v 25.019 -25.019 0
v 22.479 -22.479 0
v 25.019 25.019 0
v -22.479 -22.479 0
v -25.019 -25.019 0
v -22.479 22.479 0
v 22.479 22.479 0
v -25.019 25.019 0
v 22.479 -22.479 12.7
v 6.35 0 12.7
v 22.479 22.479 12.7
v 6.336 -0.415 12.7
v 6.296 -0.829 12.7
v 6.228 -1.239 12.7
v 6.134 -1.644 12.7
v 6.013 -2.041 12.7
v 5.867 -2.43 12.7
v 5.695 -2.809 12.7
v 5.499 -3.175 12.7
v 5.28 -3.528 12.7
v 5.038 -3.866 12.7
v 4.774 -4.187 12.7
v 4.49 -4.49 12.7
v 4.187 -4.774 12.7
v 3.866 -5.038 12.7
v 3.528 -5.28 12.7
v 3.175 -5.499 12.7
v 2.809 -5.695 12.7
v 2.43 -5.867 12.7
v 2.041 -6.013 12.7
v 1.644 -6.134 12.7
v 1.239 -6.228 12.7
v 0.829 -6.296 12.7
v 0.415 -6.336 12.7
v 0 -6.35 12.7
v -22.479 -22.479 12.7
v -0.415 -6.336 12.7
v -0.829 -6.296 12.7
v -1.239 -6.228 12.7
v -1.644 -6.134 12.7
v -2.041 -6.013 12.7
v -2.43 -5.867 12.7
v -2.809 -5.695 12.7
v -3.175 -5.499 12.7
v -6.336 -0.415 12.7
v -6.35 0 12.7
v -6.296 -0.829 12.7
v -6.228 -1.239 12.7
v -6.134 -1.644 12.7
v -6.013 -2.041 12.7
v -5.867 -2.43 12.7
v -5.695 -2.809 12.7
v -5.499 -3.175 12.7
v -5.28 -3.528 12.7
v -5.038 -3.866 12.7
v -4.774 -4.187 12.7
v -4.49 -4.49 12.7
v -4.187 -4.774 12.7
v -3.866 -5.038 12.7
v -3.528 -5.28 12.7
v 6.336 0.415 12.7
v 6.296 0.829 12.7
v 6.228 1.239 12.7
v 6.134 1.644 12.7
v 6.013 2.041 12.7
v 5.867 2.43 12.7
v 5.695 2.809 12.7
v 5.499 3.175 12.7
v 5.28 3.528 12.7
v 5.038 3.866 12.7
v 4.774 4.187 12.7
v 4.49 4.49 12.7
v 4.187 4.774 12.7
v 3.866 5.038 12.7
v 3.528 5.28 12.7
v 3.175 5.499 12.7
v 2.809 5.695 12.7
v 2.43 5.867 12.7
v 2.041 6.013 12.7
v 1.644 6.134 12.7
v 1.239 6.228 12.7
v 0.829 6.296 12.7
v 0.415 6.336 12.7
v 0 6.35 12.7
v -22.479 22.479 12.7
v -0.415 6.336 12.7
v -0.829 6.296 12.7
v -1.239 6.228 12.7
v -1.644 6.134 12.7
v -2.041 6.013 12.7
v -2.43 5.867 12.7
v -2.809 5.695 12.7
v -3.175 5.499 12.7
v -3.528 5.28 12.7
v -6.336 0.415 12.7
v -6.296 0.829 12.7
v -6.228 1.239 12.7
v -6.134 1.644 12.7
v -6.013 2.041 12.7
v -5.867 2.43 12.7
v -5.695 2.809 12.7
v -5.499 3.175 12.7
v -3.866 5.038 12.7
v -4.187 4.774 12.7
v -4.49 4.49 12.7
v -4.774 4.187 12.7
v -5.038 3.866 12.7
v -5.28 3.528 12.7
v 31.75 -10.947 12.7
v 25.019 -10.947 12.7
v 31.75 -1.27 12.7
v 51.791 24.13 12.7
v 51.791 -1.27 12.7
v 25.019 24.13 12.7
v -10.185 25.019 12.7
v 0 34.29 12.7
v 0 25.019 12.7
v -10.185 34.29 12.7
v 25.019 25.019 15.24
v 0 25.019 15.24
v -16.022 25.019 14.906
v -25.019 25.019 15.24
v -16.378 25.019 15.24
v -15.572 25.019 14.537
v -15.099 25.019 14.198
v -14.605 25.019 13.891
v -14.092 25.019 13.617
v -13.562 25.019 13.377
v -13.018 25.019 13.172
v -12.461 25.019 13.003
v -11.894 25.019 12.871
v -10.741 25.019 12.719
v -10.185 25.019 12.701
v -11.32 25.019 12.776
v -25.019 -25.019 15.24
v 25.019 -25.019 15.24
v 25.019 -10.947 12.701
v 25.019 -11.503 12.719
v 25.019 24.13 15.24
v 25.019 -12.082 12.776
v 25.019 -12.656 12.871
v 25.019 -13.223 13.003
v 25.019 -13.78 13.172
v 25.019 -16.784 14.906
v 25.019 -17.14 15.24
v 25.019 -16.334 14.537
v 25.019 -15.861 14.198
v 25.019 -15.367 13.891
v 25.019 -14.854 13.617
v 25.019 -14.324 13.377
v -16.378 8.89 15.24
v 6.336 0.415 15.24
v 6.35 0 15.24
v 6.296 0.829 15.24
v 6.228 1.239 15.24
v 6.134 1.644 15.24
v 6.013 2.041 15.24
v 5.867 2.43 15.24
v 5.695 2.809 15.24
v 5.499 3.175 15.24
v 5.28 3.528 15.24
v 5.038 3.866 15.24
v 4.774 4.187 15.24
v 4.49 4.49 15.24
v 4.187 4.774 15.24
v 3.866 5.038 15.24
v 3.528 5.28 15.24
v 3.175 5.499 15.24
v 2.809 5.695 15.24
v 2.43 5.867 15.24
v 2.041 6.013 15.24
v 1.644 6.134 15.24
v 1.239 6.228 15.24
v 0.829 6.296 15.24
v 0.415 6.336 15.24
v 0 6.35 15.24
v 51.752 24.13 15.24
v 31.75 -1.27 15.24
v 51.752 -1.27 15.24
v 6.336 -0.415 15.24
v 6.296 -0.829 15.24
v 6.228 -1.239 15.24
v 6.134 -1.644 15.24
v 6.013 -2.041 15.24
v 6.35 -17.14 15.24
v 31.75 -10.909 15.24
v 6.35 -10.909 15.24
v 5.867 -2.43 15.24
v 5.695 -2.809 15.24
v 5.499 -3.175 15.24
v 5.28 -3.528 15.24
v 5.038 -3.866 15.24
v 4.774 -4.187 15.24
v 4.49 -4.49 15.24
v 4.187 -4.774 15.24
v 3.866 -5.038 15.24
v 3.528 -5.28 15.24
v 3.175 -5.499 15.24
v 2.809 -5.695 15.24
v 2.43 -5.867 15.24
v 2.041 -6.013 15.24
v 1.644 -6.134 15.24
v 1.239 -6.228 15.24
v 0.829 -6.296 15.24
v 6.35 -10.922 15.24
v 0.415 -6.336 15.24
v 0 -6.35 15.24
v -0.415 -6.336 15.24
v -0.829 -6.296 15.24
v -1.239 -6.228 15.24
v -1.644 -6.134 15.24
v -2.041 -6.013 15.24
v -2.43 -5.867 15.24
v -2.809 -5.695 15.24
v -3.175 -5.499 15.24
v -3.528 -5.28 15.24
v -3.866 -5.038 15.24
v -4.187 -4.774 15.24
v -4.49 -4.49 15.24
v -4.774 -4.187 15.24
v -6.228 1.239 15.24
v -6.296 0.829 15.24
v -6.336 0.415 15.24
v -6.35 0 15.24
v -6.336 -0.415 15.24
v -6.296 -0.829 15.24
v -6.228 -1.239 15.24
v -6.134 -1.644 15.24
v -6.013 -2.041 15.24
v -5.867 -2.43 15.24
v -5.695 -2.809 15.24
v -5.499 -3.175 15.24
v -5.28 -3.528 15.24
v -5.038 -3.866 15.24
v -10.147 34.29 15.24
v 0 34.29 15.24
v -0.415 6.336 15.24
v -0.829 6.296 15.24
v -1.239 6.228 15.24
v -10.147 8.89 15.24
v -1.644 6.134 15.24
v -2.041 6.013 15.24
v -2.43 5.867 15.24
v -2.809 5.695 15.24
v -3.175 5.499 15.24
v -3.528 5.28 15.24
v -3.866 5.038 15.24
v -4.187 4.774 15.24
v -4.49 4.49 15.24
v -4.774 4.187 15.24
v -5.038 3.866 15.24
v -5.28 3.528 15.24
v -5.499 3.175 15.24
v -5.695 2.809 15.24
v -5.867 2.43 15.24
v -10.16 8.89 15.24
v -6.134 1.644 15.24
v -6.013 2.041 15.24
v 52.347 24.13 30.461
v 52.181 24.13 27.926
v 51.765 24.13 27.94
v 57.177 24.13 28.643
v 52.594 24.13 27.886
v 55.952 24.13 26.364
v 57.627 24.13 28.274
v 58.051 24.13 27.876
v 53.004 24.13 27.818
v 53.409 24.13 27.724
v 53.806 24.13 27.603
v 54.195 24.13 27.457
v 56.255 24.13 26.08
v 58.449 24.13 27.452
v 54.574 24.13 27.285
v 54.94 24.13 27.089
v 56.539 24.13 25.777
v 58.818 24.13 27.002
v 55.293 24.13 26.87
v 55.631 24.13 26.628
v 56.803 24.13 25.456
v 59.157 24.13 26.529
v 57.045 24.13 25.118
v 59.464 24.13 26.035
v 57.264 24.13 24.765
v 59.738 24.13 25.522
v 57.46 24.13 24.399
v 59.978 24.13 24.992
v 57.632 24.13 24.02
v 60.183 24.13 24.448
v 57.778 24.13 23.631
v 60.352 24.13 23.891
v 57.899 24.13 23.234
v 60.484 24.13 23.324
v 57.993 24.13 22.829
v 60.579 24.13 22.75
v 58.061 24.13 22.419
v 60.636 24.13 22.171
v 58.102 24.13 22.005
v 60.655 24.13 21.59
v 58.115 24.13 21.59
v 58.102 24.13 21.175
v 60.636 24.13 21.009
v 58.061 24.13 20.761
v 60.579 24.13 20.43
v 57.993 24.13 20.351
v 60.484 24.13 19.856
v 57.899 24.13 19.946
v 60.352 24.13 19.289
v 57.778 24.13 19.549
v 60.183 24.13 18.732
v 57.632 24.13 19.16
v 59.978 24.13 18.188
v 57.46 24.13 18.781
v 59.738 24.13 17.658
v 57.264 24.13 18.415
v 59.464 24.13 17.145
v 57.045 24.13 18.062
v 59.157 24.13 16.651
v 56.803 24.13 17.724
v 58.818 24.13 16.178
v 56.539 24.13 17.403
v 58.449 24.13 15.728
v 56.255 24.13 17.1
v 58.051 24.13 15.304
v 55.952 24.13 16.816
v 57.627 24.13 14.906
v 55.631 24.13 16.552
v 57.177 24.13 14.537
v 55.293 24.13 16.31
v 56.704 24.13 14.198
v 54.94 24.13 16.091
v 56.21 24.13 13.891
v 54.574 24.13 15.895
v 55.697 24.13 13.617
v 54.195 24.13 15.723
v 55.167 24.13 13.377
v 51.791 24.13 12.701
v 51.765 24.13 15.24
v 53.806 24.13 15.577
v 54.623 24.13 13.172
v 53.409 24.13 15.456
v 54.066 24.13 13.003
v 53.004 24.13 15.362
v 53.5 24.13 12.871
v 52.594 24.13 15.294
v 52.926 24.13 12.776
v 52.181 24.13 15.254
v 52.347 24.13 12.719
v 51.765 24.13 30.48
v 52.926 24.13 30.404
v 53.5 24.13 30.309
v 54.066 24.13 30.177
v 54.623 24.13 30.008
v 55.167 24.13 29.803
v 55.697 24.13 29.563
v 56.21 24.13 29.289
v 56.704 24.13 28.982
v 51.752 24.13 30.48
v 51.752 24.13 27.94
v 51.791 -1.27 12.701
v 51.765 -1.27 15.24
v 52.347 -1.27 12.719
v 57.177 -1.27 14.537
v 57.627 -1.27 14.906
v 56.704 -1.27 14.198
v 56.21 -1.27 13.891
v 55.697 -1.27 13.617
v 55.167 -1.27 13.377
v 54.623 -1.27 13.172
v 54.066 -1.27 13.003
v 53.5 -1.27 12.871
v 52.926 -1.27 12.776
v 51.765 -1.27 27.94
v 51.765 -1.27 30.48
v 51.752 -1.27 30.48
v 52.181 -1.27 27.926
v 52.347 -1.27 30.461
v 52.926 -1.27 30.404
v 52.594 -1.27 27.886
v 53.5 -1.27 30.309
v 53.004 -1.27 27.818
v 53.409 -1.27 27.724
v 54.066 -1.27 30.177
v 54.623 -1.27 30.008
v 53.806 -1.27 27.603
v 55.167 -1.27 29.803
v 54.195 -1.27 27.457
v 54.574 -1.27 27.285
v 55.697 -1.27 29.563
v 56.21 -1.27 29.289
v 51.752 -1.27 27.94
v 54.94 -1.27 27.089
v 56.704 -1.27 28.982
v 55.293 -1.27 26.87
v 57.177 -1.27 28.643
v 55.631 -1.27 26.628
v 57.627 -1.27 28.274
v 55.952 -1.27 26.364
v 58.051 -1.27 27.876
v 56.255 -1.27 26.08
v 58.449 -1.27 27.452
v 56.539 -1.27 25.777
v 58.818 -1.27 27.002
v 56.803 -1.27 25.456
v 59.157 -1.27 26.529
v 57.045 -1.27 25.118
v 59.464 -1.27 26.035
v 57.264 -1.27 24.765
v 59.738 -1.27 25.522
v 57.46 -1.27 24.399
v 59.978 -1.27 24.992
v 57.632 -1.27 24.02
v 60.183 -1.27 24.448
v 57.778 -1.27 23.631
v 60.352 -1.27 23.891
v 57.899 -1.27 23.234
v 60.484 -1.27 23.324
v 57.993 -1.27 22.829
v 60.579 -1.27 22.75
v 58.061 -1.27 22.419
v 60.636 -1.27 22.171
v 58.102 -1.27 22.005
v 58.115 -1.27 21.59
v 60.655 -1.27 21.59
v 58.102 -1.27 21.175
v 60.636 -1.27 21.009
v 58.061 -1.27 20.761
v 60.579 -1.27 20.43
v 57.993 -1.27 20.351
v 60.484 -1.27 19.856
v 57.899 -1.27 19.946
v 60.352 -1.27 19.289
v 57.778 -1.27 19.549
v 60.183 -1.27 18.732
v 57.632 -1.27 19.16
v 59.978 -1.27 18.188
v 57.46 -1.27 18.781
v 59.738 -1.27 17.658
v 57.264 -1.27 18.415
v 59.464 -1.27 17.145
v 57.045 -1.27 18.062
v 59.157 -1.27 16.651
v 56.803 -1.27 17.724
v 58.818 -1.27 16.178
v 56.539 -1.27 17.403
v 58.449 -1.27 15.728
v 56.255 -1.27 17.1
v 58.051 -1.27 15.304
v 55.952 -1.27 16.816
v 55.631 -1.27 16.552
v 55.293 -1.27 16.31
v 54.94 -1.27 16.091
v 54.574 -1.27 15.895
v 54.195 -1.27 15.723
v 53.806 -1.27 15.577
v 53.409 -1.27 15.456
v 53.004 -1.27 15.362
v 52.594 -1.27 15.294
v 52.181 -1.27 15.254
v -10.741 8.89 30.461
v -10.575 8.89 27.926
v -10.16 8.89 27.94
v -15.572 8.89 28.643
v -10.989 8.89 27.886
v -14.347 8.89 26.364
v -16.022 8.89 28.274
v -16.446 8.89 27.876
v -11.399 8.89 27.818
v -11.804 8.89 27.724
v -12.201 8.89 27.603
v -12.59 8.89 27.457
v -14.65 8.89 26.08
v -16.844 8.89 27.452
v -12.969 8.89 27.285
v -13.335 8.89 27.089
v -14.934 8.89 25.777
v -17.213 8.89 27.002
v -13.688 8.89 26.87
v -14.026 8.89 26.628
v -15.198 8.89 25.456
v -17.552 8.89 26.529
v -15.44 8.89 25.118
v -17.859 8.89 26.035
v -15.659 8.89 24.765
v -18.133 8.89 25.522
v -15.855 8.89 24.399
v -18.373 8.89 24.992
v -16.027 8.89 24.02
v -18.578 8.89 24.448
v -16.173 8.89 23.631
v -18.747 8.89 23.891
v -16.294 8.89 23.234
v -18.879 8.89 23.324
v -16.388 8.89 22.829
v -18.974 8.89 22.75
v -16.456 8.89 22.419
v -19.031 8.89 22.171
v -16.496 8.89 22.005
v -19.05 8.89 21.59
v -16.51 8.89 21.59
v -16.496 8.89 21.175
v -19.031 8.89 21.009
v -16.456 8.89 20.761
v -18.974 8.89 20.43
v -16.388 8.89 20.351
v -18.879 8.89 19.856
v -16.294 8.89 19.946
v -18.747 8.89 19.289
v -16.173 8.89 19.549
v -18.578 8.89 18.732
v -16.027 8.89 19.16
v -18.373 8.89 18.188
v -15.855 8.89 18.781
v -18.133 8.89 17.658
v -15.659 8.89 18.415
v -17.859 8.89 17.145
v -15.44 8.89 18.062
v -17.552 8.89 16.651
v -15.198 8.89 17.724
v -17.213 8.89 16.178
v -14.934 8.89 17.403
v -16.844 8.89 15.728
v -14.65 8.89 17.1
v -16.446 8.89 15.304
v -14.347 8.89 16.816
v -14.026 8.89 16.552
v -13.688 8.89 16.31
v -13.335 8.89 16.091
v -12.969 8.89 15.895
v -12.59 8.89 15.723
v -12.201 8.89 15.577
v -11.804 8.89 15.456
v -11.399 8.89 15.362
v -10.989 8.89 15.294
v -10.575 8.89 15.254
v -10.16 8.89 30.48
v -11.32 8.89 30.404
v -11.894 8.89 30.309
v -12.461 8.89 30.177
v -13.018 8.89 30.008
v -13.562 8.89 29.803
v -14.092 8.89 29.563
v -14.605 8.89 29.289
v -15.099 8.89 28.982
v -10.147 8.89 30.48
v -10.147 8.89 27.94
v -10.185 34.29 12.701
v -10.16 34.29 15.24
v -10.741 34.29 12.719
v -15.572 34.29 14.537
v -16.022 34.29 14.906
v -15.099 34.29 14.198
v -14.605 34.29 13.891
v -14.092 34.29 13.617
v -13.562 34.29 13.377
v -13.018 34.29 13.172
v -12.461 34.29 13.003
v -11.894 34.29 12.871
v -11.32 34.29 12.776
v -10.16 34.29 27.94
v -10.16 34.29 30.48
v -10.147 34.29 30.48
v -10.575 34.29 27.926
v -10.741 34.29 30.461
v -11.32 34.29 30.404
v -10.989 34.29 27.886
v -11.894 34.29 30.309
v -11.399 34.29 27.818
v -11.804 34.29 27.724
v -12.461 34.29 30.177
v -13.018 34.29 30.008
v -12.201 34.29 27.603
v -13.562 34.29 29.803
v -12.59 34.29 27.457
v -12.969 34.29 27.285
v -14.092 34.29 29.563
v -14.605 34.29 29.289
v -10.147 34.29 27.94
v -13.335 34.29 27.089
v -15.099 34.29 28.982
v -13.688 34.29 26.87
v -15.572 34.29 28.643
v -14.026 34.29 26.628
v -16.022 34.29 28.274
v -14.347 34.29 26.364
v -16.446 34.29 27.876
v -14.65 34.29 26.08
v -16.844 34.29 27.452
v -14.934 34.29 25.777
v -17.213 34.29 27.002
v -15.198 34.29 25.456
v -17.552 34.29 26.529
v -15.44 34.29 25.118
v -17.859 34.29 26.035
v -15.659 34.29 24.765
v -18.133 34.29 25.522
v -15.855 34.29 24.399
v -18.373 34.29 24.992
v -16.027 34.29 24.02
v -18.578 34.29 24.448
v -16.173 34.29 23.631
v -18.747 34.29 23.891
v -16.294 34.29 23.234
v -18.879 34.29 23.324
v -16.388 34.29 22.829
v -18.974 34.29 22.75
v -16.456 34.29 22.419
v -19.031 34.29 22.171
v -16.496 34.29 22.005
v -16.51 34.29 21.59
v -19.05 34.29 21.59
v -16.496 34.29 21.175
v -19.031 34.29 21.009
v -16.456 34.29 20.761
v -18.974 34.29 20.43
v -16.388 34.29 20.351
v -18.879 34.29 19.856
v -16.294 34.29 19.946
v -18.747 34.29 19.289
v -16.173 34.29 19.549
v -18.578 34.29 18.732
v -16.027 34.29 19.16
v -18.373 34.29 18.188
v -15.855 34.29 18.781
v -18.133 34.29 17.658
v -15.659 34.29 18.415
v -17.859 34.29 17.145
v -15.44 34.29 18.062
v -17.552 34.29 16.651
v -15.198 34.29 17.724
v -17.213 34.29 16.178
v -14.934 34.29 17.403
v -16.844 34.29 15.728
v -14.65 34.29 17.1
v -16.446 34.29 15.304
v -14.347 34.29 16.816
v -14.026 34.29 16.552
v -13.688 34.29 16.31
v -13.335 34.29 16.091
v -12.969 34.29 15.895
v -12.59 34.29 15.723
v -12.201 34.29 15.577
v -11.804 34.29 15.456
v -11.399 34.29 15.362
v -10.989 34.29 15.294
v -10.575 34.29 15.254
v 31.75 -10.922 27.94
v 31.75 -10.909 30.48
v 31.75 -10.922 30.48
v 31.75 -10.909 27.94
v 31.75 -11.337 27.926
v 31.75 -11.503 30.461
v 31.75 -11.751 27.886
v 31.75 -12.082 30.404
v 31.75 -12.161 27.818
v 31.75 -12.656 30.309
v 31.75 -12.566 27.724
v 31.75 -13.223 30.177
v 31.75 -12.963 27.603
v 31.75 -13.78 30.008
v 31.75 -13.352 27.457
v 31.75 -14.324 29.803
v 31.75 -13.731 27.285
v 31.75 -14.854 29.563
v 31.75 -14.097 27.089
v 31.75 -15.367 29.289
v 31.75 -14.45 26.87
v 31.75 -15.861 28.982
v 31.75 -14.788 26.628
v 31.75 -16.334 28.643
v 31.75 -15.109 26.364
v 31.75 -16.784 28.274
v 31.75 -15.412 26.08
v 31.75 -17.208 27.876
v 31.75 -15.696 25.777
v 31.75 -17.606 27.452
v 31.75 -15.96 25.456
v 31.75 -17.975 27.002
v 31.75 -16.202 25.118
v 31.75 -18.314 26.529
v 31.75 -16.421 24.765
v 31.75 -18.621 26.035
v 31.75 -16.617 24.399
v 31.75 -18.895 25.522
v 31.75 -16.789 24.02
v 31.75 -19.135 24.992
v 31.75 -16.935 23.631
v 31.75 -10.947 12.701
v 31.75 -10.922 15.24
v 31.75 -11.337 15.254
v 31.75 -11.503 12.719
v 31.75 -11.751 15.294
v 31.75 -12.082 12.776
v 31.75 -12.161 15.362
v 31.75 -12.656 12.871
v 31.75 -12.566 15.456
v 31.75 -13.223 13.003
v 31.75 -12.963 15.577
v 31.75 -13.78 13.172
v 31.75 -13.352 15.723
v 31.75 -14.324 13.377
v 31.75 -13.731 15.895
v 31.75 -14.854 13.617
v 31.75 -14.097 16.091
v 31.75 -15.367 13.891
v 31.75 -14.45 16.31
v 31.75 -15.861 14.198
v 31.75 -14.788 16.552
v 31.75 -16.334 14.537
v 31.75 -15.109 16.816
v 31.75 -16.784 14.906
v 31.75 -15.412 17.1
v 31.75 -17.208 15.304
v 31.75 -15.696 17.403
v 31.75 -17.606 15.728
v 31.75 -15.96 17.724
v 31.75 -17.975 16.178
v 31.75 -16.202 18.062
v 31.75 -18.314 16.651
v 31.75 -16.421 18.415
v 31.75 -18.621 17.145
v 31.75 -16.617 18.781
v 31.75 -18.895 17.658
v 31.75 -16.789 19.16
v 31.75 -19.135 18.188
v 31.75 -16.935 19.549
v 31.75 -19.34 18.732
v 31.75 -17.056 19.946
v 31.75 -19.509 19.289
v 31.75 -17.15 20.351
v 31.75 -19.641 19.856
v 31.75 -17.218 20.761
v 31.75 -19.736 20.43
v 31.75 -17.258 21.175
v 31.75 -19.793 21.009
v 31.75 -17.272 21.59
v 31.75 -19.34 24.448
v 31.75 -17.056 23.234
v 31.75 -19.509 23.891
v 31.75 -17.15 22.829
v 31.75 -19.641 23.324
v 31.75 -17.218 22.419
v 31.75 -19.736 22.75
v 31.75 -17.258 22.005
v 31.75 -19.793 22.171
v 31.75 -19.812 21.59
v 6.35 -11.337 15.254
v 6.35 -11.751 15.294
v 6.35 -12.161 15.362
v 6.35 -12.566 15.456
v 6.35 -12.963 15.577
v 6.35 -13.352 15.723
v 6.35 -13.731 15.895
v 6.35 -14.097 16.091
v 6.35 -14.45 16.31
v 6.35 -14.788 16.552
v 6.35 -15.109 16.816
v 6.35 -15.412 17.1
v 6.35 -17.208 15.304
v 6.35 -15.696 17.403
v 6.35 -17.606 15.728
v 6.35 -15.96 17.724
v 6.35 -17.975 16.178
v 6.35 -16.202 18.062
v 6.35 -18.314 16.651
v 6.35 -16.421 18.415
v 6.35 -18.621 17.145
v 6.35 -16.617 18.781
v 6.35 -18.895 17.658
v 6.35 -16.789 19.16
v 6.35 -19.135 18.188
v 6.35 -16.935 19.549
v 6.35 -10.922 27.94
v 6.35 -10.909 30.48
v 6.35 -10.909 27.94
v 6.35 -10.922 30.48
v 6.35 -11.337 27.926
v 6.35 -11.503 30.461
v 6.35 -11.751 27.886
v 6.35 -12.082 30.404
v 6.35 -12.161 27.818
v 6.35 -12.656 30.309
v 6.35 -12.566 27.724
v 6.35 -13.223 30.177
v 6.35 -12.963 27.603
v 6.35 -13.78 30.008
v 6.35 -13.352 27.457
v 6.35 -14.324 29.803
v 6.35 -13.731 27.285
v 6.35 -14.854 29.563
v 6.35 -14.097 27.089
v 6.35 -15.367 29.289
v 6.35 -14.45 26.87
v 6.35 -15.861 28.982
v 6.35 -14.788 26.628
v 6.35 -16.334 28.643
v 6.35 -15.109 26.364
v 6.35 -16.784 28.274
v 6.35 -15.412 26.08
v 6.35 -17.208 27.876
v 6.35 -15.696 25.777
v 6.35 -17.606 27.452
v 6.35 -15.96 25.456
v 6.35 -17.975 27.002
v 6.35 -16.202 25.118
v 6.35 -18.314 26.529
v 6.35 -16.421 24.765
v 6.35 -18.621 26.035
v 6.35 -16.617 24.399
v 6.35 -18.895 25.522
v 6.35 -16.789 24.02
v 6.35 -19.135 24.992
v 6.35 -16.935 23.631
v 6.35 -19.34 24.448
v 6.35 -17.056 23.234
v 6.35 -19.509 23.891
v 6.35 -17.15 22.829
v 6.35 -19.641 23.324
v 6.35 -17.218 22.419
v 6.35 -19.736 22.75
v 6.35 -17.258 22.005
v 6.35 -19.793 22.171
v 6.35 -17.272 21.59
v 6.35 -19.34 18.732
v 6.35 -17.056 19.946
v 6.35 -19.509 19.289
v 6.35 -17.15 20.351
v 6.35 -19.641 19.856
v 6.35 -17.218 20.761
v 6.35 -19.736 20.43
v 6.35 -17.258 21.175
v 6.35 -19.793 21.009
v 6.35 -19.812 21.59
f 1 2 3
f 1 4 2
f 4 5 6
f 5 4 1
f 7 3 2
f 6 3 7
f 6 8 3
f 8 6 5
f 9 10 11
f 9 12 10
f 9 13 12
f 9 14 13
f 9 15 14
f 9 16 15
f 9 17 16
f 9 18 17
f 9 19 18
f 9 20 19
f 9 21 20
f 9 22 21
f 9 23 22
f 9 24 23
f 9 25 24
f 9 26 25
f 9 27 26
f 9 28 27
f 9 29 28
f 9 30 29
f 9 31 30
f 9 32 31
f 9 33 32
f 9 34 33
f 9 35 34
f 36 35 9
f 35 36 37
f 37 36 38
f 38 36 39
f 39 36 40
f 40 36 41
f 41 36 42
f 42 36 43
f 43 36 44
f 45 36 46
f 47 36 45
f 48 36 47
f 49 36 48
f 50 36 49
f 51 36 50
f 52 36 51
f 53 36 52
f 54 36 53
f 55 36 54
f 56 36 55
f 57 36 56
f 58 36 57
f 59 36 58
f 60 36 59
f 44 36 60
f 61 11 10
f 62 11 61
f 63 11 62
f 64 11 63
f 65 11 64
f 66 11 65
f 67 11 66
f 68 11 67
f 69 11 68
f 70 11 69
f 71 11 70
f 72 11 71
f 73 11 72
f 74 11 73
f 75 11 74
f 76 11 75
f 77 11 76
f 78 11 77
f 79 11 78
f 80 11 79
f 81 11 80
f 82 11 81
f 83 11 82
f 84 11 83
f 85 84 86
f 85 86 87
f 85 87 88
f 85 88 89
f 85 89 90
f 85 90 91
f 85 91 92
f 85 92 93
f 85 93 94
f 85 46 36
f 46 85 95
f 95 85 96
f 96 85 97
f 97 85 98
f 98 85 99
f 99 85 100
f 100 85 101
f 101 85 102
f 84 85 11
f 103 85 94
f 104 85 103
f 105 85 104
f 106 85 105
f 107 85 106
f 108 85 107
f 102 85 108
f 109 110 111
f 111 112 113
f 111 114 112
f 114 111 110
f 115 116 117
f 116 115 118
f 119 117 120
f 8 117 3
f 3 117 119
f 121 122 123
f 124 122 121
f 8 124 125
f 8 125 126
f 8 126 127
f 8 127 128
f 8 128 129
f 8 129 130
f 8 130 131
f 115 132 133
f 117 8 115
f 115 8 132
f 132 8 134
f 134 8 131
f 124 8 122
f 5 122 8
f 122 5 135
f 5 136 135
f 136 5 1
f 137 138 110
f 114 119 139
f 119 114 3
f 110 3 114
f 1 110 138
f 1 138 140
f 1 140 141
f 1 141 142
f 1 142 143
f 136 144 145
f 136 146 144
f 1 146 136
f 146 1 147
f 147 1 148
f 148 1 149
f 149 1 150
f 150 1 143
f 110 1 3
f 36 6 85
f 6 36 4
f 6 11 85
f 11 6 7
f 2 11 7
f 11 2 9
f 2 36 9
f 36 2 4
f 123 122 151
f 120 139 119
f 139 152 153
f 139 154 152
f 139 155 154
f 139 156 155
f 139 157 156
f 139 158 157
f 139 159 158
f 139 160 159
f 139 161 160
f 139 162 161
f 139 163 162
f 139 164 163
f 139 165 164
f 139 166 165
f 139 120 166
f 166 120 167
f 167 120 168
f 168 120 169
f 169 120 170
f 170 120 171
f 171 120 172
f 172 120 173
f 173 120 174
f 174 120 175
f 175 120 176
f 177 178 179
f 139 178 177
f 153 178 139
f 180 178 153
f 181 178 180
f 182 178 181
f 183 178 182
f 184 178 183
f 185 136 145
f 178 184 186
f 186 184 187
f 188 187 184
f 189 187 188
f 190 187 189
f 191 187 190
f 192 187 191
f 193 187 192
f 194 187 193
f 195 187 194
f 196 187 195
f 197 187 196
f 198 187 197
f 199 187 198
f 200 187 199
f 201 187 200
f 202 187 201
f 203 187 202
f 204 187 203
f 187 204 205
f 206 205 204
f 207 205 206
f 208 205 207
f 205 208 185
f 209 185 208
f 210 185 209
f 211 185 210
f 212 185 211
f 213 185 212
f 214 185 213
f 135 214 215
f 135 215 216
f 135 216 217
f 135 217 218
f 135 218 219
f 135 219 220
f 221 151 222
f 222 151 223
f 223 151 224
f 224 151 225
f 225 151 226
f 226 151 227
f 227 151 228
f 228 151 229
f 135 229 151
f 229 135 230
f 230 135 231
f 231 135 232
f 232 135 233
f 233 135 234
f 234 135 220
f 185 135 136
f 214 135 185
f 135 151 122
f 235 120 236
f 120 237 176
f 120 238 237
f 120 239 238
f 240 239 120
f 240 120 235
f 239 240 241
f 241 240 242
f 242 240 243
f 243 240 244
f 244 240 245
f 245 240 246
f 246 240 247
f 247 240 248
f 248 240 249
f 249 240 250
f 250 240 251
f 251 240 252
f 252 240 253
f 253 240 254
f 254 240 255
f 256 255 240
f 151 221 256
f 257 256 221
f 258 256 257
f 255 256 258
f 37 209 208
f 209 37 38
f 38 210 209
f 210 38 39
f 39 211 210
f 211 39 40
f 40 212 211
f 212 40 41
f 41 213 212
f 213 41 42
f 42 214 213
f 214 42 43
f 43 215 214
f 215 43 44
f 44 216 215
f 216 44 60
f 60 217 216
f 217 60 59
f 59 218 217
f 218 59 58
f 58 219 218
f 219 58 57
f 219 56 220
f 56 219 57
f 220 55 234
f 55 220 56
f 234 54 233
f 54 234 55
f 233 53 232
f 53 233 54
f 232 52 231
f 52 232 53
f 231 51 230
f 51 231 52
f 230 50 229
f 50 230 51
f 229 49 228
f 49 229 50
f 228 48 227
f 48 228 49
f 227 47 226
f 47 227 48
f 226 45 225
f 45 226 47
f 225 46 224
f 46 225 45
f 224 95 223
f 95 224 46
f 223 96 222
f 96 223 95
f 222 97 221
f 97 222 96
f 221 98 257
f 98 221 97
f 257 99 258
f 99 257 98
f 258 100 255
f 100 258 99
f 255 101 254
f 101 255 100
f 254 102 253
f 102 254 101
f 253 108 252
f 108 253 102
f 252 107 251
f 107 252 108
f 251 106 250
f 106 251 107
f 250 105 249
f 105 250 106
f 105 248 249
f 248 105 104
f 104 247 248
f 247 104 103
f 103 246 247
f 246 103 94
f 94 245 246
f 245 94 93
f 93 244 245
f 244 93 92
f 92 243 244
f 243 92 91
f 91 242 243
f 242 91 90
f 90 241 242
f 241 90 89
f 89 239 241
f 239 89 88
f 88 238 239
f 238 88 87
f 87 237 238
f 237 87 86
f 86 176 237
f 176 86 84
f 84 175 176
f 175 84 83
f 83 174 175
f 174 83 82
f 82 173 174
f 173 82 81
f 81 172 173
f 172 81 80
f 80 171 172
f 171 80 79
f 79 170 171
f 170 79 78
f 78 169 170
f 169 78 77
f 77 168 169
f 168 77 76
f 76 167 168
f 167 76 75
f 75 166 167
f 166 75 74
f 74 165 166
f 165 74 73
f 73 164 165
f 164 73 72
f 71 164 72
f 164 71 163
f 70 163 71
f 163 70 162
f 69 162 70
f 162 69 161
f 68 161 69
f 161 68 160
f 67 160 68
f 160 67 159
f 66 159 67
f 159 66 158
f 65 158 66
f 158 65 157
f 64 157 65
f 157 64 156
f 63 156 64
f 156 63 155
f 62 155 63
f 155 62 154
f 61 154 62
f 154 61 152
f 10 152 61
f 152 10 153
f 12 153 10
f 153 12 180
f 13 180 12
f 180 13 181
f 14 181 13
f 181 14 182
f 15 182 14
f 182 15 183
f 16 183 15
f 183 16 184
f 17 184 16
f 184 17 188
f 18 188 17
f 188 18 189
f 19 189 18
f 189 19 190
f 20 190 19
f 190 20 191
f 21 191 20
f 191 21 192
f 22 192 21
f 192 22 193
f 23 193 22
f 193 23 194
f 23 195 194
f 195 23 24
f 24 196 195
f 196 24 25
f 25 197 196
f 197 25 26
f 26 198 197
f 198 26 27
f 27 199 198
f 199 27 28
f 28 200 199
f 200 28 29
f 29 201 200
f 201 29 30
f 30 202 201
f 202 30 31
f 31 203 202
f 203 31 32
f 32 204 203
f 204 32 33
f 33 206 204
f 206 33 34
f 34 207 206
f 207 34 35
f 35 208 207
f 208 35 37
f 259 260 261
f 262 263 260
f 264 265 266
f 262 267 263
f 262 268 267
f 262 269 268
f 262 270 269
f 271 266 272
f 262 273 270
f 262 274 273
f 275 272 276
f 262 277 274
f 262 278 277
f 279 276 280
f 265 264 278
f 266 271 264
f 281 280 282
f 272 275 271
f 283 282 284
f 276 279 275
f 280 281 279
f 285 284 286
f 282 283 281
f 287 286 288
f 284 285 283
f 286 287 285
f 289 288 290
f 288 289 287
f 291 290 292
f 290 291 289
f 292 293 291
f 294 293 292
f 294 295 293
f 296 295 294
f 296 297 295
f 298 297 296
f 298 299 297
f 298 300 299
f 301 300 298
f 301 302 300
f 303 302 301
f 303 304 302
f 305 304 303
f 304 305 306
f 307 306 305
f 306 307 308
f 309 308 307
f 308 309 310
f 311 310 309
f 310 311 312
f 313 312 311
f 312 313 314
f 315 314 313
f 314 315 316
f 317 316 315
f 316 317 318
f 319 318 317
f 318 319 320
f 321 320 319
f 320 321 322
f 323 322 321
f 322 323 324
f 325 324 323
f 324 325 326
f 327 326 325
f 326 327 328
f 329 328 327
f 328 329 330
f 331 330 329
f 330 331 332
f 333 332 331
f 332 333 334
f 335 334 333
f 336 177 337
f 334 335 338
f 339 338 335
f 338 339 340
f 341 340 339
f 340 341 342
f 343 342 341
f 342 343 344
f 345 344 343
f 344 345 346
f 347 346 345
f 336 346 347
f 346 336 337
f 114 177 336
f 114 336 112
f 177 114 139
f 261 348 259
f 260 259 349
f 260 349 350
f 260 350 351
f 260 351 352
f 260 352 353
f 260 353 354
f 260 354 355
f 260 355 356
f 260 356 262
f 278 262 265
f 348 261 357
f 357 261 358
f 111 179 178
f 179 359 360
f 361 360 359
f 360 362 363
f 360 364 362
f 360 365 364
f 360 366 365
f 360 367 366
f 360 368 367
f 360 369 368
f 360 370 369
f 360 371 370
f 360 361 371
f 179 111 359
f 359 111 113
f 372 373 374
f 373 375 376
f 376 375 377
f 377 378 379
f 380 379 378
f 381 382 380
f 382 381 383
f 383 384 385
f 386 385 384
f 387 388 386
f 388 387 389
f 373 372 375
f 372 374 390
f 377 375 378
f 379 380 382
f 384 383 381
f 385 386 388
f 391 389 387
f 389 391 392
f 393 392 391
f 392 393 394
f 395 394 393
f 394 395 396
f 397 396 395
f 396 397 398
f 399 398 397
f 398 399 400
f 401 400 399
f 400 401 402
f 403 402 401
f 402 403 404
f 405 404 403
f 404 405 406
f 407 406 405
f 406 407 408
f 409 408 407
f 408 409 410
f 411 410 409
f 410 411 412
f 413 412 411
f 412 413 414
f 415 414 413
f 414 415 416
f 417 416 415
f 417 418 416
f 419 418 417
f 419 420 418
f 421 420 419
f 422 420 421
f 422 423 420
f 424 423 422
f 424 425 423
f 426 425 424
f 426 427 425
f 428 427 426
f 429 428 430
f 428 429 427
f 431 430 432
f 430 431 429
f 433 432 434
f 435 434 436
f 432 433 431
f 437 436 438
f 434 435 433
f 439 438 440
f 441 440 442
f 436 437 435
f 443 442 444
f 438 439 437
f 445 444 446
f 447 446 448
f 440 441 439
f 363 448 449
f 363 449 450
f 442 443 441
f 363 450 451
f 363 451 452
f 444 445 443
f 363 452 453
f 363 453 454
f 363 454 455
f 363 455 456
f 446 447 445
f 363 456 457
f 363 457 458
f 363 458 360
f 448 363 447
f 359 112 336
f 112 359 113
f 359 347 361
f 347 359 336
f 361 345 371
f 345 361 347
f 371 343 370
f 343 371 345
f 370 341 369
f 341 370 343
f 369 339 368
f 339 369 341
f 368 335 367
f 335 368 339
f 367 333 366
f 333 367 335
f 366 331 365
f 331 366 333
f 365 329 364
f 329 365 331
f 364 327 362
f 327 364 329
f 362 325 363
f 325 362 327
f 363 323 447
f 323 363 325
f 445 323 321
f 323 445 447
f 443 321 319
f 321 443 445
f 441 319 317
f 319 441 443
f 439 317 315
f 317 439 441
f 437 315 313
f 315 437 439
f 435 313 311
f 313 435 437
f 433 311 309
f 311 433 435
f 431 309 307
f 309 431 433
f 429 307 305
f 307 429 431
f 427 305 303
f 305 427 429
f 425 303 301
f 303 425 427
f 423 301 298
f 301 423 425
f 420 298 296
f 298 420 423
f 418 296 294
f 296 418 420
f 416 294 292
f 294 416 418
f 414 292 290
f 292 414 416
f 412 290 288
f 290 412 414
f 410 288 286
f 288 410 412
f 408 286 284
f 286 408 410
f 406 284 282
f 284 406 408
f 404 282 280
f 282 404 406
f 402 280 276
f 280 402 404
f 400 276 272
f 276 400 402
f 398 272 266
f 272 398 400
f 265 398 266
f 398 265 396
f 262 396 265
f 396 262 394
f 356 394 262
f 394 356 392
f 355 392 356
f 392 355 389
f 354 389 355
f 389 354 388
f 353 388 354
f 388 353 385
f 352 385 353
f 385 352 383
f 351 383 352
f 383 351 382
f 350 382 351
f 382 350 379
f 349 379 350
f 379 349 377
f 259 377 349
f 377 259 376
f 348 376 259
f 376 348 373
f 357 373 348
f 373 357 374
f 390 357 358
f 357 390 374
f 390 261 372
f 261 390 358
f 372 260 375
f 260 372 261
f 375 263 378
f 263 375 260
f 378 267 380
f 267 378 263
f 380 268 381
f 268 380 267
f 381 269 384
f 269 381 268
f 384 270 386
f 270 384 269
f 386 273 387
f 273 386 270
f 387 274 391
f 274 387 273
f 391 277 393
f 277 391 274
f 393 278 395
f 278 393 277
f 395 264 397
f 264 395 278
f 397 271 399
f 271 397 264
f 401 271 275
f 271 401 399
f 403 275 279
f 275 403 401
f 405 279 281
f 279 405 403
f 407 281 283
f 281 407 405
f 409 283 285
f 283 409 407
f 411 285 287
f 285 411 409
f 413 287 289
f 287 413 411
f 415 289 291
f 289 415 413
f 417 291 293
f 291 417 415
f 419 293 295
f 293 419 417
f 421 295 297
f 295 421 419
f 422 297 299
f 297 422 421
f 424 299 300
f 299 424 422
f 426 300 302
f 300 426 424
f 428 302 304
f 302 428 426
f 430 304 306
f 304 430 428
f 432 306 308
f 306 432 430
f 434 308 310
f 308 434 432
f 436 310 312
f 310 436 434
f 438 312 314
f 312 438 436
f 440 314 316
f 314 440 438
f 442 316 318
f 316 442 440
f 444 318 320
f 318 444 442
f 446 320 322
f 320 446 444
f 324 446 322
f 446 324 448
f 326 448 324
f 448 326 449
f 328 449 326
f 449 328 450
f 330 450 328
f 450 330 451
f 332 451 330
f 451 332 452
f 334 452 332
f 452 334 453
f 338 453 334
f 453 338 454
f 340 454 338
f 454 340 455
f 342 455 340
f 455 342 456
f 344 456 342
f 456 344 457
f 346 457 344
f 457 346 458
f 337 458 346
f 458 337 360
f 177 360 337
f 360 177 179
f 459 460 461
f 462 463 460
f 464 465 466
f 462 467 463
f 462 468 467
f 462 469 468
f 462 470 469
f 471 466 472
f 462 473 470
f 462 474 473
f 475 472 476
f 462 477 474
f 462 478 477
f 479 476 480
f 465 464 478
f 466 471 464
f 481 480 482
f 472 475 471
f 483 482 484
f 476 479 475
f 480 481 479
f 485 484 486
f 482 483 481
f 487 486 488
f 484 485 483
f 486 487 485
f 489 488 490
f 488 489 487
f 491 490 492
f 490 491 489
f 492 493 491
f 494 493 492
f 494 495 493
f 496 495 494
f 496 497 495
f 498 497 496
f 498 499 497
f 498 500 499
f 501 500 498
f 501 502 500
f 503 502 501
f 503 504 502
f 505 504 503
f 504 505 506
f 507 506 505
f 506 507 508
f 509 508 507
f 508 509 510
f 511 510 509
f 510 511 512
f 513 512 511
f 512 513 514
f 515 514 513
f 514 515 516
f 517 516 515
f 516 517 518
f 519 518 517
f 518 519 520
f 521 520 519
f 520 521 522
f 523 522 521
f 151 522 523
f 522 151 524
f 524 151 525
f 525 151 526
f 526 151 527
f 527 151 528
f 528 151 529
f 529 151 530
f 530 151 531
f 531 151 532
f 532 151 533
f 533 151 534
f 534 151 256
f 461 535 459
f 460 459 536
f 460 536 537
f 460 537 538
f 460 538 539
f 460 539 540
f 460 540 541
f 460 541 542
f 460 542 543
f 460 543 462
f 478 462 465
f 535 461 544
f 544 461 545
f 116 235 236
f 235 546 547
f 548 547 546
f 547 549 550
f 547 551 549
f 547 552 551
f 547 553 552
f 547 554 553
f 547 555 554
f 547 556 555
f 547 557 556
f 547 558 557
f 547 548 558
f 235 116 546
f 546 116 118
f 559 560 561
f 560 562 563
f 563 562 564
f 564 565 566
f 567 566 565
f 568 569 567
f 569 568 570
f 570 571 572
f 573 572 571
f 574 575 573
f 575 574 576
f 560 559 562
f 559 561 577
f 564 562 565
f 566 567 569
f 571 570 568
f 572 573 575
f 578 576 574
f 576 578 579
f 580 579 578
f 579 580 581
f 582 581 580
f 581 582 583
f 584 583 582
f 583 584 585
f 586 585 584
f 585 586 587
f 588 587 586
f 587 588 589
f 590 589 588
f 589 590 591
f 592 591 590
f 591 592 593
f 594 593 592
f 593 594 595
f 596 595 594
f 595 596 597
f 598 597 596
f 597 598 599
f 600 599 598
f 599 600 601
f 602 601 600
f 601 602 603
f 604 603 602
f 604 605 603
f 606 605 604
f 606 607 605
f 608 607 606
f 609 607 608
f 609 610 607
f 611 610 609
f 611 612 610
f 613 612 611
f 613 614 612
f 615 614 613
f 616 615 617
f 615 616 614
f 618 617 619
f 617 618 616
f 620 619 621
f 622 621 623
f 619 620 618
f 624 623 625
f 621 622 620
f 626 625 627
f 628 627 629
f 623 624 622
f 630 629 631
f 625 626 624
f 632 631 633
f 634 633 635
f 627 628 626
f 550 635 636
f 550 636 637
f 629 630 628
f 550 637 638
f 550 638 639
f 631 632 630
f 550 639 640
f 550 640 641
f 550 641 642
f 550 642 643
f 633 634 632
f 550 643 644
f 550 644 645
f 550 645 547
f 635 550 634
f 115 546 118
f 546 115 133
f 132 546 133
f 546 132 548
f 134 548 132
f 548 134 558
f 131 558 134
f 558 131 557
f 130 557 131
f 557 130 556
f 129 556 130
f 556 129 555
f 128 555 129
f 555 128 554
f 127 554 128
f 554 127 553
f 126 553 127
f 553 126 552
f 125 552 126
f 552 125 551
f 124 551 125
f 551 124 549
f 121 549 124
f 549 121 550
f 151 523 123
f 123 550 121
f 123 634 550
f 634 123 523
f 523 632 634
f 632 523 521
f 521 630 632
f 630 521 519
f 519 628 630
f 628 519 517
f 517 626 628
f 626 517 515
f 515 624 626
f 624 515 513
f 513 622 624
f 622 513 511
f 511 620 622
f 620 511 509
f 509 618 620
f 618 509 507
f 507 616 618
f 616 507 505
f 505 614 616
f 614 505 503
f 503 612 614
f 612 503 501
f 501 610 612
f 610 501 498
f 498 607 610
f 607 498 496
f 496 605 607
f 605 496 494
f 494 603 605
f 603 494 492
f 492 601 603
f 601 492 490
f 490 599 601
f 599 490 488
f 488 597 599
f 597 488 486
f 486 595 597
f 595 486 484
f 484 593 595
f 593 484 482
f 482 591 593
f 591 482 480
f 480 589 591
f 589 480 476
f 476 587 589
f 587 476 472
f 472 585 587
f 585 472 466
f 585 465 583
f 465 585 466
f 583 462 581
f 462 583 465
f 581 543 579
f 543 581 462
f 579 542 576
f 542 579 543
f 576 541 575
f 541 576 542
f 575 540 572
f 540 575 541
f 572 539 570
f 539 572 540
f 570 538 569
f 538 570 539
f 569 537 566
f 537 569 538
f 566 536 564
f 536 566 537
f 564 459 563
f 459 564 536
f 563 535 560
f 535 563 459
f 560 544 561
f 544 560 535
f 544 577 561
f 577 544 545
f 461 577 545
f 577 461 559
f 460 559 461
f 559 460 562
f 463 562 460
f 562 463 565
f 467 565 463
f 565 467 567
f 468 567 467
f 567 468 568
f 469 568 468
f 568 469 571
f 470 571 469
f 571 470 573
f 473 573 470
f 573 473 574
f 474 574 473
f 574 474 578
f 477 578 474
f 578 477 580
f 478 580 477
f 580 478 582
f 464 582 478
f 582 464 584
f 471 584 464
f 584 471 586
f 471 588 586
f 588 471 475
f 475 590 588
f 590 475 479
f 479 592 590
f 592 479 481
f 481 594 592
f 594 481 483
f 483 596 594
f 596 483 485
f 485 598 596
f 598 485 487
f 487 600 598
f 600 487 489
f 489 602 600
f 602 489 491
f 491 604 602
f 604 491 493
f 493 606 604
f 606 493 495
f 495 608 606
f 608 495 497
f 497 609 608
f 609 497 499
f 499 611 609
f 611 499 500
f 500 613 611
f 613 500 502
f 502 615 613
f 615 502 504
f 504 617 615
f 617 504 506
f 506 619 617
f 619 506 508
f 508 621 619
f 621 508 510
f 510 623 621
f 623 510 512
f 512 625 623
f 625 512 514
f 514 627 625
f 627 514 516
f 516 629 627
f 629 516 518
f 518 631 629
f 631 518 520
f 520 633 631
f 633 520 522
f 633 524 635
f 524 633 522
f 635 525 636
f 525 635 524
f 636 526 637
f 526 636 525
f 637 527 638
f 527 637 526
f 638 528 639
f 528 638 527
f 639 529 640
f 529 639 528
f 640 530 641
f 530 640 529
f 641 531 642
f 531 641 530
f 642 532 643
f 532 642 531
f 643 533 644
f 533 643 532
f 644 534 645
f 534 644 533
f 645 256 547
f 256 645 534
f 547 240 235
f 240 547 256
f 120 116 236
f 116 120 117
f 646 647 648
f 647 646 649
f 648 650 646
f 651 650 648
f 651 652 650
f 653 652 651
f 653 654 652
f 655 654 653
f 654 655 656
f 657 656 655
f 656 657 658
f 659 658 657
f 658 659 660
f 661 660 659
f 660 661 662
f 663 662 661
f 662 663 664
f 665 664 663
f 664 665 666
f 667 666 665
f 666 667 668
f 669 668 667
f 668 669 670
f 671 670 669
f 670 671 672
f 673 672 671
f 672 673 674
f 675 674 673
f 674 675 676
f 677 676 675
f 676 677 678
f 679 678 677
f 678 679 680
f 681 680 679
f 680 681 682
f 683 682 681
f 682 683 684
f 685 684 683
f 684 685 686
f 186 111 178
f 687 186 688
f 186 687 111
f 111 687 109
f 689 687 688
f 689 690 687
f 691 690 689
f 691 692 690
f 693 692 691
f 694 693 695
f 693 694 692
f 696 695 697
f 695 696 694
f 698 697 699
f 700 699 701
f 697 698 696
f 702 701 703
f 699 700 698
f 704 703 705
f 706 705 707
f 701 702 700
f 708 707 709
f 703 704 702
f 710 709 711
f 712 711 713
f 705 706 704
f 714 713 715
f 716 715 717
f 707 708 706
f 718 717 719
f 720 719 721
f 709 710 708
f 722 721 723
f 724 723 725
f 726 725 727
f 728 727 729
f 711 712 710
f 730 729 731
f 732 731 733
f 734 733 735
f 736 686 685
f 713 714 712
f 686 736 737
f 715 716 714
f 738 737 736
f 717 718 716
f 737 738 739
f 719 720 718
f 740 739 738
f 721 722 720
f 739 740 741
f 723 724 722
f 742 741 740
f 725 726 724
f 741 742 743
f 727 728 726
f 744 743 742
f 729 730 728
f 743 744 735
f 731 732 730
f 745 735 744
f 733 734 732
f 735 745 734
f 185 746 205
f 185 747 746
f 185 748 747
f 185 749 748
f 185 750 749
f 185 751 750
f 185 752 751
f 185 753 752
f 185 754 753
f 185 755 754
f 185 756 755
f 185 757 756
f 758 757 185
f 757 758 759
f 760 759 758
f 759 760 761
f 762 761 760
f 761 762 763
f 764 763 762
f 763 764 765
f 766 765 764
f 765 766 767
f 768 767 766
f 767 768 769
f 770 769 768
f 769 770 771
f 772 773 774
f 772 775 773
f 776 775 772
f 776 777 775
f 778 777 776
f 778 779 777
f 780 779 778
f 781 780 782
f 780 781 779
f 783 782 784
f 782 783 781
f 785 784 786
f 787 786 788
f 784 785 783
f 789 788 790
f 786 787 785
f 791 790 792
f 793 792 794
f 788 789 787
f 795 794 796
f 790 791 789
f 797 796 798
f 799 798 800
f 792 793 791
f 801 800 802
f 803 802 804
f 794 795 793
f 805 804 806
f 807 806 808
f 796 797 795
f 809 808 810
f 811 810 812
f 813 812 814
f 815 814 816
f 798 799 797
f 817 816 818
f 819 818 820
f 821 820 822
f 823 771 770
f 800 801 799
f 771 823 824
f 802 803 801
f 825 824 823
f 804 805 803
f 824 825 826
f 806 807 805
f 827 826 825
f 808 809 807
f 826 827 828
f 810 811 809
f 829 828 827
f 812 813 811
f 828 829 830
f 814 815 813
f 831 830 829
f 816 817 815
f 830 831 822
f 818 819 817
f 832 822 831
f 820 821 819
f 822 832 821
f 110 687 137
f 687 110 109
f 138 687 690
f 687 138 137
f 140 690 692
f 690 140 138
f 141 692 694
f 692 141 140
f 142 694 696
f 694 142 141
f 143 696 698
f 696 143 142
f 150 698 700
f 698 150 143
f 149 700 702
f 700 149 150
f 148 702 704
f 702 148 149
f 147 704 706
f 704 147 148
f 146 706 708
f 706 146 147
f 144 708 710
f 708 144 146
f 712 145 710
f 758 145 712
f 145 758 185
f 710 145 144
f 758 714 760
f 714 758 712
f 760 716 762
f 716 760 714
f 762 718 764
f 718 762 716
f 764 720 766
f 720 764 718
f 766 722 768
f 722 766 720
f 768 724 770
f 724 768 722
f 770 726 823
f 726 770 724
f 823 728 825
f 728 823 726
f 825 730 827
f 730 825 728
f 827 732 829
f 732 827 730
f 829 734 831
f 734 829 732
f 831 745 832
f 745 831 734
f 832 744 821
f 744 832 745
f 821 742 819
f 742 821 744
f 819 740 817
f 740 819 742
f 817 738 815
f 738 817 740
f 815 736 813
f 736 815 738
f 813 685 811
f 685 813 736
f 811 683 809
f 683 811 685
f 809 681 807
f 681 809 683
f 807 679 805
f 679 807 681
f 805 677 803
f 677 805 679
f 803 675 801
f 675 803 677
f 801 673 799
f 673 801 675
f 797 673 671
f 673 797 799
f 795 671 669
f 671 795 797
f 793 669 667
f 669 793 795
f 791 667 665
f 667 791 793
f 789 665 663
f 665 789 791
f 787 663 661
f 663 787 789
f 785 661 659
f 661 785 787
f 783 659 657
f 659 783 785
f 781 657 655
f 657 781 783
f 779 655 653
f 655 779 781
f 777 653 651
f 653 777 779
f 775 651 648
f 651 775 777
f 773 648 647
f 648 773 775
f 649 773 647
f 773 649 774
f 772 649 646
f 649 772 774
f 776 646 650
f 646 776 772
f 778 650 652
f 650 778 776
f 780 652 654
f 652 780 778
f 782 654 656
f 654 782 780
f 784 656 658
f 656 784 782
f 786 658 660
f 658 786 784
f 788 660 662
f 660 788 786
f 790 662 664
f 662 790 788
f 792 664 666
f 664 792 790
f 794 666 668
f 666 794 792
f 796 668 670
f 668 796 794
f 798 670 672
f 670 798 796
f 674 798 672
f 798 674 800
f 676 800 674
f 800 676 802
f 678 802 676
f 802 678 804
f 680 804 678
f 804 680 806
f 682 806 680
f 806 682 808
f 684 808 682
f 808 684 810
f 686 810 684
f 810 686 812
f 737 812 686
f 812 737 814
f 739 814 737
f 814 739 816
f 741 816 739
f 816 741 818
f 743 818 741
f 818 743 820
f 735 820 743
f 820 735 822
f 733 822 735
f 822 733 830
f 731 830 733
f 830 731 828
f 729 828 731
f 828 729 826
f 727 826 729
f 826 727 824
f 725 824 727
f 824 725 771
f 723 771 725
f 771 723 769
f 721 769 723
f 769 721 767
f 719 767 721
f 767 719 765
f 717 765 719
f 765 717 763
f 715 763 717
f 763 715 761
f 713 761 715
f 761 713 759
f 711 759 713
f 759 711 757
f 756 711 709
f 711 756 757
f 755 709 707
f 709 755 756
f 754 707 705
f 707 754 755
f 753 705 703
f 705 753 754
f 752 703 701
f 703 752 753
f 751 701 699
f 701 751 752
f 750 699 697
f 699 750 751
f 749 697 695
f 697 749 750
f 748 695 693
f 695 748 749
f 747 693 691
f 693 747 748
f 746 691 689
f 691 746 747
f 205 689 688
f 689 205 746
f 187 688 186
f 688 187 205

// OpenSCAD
ViewScale = [0.0254, 0.0254, 0.0254];

module model_phone()
{
//    linear_extrude(410)
//    square([2910, 6080], center=true);

    *linear_extrude(6080)
    square([2910, 410], center=true);

    // Long sides
    for (ii=[-1,1]) {
        translate([ii*2470/2, 0, (6080-5250)/2-(450/2)])
        linear_extrude(5250+450)
        circle(450/2, $fn=96);
    }

    // Short sides
    translate([-450/2, 0, 450/2])
    rotate([0, 90, 0])
    translate([0, 0, -2070/2])
    linear_extrude(2070+450)
    circle(450/2, $fn=96);

    translate([-450/2, 0, 6080-450/2])
    rotate([0, 90, 0])
    translate([0, 0, -2070/2])
    linear_extrude(2070+450)
    circle(450/2, $fn=96);

    // Lens
    translate([-2910/2+433+200, -400/2, 6080-450-200])
    rotate([90, 0, 0])
    translate([0, 0, -15])
    linear_extrude(30)
    circle(400/2, $fn=96);

    // Corner spheres
    translate([-2910/2+450/2, 0, 450/2])
    sphere(450/2, $fn=96);

    translate([2910/2-450/2, 0, 450/2])
    sphere(450/2, $fn=96);

    translate([-2910/2+450/2, 0, 6080-450/2])
    sphere(450/2, $fn=96);

    translate([2910/2-450/2, 0, 6080-450/2])
    sphere(450/2, $fn=96);


}

module telescopemount()
{
    linear_extrude(50)
    difference()
    {
        circle(1750/2, $fn=96);
        circle(1265/2, $fn=96);
    }
    translate([0, 0, 49])
    linear_extrude(181)
    difference()
    {
        circle(1750/2, $fn=96);
        circle(1350/2, $fn=96);
    }
    translate([0, 0, 229])
    linear_extrude(281)
    difference()
    {
        circle(1750/2, $fn=96);
        circle(1610/2, $fn=96);
    }

    linear_extrude(550)
    difference() {
        square([1850, 1850], center=true);
        square([1650, 1650], center=true);
    }

}

module shortphoneclip(taillen)
{
    linear_extrude(1000) {
        intersection() {
            translate([0, 175, 0])
            square([701, 351], center=true);
            difference()
            {
                circle(350, $fn=96);
                circle(250, $fn=96);
            }
        }

        translate([250, -taillen, 0])
        square([100, taillen+1]);

        *translate([-400, 200, 0])
        square([400, 100]);
    }

}

module phonemount()
{
    linear_extrude(500)
    difference() {
        square([1970, 1970], center=true);
        square([1770, 1770], center=true);
    }
    translate([0, 0, 500])
    linear_extrude(100)
    difference() {
        square([1970, 1970], center=true);
        circle(500/2, $fn=96);
    }


    //translate([2910/2+(450/2)+433-(250/2), 6080/2-450-200, 750])
    translate([30+2910/2+(450/2)+433-(250/2)+20, 700, 850])
    rotate([0, 90, -90])
    translate([0, 0, -250])
    shortphoneclip(1200);

    translate([-420+20, 600, 850])
    rotate([0, 90, 90])
    translate([0, 0, -250])
    shortphoneclip(400);

    translate([1000, -430, 850])
    rotate([0, 90, -180])
    translate([0, 0, -250])
    shortphoneclip(400);

}

module forViewing()
{
    *telescopemount();
//    translate([0, 0, 100])
    phonemount();
    color("cyan")
    translate([2910/2-(450/2)-433+20, 6080/2-450-200, 850])
    rotate([90, 0, 0])
    translate([0, 0, -6080/2])
    model_phone();
    //shortphoneclip();
}

module forPrinting()
{
    phonemount();
//    telescopemount();
//    translate([0, 200, 0])
//    shortphoneclip();
}

scale(ViewScale)
{
//    forViewing();
    forPrinting();
}
